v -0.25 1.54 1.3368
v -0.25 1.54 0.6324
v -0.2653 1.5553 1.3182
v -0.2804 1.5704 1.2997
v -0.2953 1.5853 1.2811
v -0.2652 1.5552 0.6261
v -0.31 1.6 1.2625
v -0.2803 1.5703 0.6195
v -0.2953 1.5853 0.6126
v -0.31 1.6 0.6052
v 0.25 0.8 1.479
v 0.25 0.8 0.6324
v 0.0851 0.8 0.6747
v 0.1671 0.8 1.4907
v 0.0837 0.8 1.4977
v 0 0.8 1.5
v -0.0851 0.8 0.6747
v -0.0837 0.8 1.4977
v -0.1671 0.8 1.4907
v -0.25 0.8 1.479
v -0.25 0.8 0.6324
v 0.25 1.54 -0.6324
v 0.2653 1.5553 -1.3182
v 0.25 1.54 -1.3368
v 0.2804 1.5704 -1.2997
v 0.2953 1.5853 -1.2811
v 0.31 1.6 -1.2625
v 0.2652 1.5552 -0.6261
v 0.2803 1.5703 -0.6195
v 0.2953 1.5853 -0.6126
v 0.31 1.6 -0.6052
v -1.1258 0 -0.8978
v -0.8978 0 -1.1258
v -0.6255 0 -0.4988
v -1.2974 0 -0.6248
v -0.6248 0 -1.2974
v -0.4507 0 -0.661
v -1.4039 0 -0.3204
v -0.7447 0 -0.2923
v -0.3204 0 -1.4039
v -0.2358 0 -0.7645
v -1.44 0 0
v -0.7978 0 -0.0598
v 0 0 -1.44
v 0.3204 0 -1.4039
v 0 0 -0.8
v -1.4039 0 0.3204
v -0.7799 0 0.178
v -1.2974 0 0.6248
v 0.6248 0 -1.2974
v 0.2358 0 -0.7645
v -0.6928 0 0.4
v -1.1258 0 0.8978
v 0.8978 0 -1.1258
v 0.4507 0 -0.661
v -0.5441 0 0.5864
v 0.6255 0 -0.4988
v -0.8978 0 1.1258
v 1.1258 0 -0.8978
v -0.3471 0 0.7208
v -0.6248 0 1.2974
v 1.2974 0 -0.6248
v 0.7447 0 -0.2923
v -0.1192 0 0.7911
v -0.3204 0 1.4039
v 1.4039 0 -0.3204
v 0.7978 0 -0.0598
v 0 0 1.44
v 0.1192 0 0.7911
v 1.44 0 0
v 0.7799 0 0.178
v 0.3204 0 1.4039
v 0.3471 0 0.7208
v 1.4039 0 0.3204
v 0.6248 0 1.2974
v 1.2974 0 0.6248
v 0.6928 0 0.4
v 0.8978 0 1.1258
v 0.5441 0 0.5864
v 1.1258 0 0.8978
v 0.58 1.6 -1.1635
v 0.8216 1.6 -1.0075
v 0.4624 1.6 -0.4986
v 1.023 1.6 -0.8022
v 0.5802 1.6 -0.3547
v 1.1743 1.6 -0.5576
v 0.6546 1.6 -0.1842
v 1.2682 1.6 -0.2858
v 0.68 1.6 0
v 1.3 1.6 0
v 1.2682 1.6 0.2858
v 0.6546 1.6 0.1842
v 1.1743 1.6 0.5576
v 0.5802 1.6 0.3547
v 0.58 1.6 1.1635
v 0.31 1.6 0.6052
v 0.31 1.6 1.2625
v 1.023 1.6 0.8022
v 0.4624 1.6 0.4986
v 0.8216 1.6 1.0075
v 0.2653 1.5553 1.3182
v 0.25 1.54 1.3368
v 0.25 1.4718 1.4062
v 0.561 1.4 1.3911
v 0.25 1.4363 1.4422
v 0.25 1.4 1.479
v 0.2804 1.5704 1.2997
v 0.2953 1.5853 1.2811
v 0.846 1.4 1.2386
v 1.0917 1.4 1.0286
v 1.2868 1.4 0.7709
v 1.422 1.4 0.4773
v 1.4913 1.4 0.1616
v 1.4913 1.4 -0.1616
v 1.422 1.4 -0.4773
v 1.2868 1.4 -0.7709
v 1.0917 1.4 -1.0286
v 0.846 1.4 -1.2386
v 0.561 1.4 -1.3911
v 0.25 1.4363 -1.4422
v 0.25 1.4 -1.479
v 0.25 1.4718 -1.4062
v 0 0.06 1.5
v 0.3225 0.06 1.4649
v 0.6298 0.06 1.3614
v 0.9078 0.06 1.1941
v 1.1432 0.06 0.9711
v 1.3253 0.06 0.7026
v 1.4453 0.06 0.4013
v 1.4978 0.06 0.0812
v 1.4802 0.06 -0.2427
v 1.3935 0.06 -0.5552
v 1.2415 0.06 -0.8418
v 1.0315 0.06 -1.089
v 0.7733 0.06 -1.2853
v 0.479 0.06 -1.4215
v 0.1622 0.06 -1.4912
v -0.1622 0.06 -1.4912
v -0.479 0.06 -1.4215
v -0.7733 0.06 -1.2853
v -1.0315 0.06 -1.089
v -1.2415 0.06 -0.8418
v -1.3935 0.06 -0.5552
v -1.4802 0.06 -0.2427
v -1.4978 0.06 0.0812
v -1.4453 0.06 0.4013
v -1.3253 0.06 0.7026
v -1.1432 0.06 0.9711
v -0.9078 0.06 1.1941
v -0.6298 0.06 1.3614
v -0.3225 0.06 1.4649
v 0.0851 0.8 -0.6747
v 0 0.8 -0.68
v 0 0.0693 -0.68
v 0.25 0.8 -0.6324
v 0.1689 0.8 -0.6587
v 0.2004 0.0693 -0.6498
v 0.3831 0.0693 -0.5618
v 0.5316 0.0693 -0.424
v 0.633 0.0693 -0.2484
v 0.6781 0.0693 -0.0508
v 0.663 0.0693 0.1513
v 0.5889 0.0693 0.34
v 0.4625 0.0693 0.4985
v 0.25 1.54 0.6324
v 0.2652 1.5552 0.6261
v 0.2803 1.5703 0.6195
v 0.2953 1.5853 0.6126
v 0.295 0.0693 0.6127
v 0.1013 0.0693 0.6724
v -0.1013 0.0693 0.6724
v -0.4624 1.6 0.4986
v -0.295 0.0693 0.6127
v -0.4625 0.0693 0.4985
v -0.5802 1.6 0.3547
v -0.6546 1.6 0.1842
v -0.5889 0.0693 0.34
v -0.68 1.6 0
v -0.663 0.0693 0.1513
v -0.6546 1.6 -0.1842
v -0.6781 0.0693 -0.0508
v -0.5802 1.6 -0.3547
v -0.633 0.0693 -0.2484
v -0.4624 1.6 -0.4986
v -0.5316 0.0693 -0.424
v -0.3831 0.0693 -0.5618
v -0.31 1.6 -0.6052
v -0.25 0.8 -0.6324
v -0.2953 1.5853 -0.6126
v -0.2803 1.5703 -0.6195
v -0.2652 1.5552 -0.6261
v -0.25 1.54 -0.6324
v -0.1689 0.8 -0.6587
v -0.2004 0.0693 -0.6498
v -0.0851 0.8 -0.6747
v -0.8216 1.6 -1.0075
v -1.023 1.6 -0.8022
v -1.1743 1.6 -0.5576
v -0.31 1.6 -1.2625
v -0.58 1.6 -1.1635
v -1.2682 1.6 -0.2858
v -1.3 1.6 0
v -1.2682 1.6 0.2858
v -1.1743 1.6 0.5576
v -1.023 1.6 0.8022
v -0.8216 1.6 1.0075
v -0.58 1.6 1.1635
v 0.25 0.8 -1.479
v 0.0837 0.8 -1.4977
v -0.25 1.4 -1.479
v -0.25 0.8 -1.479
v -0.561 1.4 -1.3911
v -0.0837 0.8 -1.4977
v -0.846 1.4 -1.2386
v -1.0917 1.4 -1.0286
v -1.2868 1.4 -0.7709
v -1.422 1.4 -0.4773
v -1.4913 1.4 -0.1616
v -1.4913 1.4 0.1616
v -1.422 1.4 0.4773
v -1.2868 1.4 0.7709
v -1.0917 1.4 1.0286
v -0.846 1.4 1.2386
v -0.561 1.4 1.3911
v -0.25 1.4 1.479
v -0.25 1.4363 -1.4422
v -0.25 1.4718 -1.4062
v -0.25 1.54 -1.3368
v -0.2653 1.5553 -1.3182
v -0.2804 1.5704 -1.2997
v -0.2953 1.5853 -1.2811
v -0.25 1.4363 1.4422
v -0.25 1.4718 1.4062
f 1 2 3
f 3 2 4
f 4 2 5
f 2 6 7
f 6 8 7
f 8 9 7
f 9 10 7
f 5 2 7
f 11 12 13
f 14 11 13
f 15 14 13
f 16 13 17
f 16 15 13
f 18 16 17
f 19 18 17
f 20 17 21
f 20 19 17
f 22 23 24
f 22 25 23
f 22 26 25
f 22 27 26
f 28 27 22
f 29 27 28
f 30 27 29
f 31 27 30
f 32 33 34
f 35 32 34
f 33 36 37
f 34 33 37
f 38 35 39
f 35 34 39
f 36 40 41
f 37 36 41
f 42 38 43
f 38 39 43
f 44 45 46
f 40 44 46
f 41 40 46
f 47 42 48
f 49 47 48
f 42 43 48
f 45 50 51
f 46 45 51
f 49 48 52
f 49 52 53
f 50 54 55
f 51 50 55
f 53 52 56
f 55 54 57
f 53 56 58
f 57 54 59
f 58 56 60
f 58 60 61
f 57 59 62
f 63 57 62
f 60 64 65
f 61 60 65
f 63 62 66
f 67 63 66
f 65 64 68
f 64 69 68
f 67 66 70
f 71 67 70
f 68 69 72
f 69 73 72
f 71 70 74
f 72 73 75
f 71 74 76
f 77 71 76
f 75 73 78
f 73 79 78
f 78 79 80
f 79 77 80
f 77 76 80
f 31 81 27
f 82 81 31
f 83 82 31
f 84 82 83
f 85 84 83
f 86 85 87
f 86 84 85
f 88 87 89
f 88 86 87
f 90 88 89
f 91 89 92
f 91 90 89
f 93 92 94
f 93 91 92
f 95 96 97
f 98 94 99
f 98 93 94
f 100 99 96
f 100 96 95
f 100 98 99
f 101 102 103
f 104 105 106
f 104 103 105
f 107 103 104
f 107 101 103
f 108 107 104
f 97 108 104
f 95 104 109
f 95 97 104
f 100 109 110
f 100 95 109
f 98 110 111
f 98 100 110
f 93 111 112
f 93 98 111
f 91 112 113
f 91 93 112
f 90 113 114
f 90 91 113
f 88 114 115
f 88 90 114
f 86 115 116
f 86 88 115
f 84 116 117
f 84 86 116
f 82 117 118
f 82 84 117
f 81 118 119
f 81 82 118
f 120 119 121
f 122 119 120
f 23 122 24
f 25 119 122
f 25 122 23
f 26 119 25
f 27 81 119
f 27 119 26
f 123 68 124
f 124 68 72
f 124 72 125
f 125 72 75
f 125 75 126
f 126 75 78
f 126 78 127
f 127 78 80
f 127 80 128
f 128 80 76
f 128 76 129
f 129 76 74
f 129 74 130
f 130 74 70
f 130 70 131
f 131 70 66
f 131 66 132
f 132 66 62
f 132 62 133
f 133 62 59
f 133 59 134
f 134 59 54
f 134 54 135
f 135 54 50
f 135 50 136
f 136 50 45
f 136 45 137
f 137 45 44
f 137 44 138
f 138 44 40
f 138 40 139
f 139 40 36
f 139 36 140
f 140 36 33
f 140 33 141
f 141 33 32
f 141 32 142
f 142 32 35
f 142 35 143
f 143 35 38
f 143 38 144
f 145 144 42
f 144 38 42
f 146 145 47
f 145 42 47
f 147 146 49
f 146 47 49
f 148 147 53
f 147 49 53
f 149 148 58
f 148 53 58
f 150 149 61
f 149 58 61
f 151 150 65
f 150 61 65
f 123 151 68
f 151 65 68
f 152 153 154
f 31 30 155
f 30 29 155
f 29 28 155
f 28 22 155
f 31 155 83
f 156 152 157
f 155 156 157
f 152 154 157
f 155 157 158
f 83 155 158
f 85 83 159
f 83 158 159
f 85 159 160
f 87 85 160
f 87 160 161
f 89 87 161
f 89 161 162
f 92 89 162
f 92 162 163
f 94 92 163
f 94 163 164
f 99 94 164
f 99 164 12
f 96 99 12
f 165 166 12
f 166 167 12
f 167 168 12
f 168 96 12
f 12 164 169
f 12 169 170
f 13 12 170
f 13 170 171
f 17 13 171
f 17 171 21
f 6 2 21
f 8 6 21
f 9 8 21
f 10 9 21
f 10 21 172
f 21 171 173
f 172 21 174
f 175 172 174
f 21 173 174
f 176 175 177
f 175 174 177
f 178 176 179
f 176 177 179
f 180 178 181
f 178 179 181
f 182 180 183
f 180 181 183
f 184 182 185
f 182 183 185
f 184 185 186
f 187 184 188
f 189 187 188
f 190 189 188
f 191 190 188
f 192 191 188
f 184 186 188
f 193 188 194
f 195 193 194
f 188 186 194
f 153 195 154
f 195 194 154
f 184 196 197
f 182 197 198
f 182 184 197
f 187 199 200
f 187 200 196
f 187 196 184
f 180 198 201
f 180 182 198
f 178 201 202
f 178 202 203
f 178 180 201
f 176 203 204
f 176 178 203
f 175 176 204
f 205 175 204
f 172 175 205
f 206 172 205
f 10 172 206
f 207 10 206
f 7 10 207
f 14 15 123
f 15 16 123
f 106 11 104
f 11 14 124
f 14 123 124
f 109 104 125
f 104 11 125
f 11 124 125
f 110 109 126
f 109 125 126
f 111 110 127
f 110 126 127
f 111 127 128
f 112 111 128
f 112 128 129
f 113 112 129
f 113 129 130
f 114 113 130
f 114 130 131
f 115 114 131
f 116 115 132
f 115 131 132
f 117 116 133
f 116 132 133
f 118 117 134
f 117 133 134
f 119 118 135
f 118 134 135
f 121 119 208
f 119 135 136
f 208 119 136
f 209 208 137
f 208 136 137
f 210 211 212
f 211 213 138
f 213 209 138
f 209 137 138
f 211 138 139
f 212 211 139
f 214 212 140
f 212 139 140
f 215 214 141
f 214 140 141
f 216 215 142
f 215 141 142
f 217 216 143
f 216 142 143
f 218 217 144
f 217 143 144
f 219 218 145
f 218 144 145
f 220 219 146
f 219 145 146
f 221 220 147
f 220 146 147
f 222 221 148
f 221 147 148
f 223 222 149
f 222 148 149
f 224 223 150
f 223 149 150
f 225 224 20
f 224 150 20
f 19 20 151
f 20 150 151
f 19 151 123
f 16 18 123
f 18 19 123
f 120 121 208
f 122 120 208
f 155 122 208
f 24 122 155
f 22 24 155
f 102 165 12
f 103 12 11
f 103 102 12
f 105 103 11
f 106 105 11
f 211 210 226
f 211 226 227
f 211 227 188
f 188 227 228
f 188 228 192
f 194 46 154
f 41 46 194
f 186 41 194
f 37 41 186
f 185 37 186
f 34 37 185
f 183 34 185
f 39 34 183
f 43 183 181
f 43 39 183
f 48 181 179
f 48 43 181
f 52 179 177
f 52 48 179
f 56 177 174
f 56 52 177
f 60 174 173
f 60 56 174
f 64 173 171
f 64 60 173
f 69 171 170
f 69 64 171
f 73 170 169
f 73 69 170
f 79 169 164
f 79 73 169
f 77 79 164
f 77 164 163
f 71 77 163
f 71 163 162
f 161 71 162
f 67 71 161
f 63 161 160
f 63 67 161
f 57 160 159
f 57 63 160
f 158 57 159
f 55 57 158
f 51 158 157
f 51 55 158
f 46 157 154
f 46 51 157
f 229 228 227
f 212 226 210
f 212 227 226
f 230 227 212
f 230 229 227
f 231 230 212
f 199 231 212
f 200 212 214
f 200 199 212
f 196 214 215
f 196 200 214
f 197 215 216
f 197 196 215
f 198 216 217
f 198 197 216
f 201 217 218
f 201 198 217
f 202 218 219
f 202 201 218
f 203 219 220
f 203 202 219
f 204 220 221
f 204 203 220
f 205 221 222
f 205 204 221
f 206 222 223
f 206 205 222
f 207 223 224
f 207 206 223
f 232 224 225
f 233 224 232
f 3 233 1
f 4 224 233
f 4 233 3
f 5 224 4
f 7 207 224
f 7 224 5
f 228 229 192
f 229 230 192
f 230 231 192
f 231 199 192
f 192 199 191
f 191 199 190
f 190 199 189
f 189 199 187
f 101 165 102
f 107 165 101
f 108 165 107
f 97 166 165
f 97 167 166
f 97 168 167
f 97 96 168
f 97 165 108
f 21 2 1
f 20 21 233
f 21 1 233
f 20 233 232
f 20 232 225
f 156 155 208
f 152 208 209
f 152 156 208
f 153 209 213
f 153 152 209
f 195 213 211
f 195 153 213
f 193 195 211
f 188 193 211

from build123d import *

# Parameters (mm, degrees)
SKICA1_R                 = 1.5
VYSUNOUT1_DEPTH          = 1.6
SKICA2_W                 = 0.5
SKICA2_H                 = 3
ODEBRAT_VYSUNUT_M2_DEPTH = 0.8
ZKOSIT1_SIZE             = 0.2
ZKOSIT3_SIZE             = 0.06
SKICA3_R                 = 0.68
ODEBRAT_VYSUNUT_M3_DEPTH = 3.657066051


with BuildPart() as part:
    # Skica1 → Vysunout1 (new body)
    with BuildSketch(Plane(origin=(0, 0, 0), x_dir=(1, 0, 0), z_dir=(0, 1, 0))):
        with Locations(Location((0, 0, 0), (0, 0, 270))):
            Circle(SKICA1_R)
    extrude(amount=VYSUNOUT1_DEPTH)

    # Skica2 → Odebrat vysunutím2 (cut)
    with BuildSketch(Plane(origin=(0, 1.6, 0), x_dir=(-1, 0, 0), z_dir=(0, 1, 0))):
        Rectangle(SKICA2_W, SKICA2_H)
    extrude(amount=-ODEBRAT_VYSUNUT_M2_DEPTH, mode=Mode.SUBTRACT)

    # Zkosit1
    zkosit1_edges = [part.edges().sort_by_distance(p)[0] for p in [
        (1.5, 1.6, 0),
        (-1.5, 1.6, 0),
    ]]
    chamfer(zkosit1_edges, length=ZKOSIT1_SIZE)

    # Zkosit3
    zkosit3_edges = [part.edges().sort_by_distance(p)[0] for p in [
        (0, 0, -1.5),
        (-0.25, 1.6, 0),
        (0.25, 1.6, 0),
    ]]
    chamfer(zkosit3_edges, length=ZKOSIT3_SIZE)

    # Skica3 → Odebrat vysunutím3 (cut, through all)
    with BuildSketch(Plane.XZ):
        with Locations(Location((0, 0, 0), (0, 0, 270))):
            Circle(SKICA3_R)
    extrude(amount=-ODEBRAT_VYSUNUT_M3_DEPTH, mode=Mode.SUBTRACT)

    # Skica4 → Odebrat otočením1 (revolve, cut)
    with BuildSketch(Plane.XY, mode=Mode.PRIVATE) as odebrat_oto_en_m1_sk:
        Polygon((-0.8, 0), (0, 0), (0, 0.461880215), align=None)
    revolve(odebrat_oto_en_m1_sk.sketch.rotate(Axis((0, 0, 0), (0, 1, 0)), 270), axis=Axis((0, 0, 0), (0, 1, 0)), mode=Mode.SUBTRACT)


solid = part.part
